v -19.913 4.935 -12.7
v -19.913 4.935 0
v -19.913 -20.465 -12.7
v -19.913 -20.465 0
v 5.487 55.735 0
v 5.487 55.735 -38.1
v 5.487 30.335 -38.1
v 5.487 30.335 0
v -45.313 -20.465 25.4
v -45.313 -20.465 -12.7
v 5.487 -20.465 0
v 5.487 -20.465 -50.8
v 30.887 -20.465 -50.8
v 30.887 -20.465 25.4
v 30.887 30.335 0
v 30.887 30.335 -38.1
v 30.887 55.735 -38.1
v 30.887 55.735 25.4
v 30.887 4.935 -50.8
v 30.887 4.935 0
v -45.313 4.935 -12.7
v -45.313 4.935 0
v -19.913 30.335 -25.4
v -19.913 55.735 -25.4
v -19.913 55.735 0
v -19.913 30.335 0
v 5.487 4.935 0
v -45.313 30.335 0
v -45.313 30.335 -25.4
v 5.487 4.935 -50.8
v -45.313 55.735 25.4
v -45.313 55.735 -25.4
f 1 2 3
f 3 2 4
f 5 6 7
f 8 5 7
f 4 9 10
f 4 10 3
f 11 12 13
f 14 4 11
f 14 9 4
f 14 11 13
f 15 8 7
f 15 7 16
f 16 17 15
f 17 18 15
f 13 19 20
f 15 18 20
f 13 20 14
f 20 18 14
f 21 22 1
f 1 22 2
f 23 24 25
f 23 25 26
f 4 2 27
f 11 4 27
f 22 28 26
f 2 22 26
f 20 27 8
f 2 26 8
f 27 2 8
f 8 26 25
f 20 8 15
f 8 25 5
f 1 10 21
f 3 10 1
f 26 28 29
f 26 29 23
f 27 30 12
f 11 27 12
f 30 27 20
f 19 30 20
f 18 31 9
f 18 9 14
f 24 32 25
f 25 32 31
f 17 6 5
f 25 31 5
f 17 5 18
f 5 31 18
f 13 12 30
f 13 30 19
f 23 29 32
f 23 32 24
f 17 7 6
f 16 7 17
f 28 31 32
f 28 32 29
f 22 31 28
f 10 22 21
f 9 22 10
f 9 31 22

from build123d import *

# Parameters (mm, degrees)
F0_W     = 76.2
F0_H     = 76.2
F1_DEPTH = 25.4
F2_W     = 25.4
F2_H     = 25.4
F3_DEPTH = 25.4
F4_W     = 25.4
F4_H     = 25.4
F5_DEPTH = 12.7
F6_W     = 25.4
F6_H     = 25.4
F7_DEPTH = 50.8
F8_W     = 25.4
F8_H     = 25.4
F9_DEPTH = 38.1


with BuildPart() as f1:
    # F0 (on Top) → F1 (new body)
    with BuildSketch(Plane.XY):
        with Locations((-7.212972, 17.6349)):
            Rectangle(F0_W, F0_H)
    extrude(amount=F1_DEPTH)

    # F2 (on face) → F3 (join)
    with BuildSketch(Plane(origin=(0, 0, 0), x_dir=(1, 0, 0), z_dir=(0, 0, -1))):
        with Locations((-32.612972, -43.0349)):
            Rectangle(F2_W, F2_H)
    extrude(amount=F3_DEPTH)

    # F4 (on face) → F5 (join)
    with BuildSketch(Plane(origin=(0, 0, 0), x_dir=(1, 0, 0), z_dir=(0, 0, -1))):
        with Locations((-32.612972, 7.7651)):
            Rectangle(F4_W, F4_H)
    extrude(amount=F5_DEPTH)

    # F6 (on face) → F7 (join)
    with BuildSketch(Plane(origin=(0, 0, 0), x_dir=(1, 0, 0), z_dir=(0, 0, -1))):
        with Locations((18.187028, 7.7651)):
            Rectangle(F6_W, F6_H)
    extrude(amount=F7_DEPTH)

    # F8 (on face) → F9 (join)
    with BuildSketch(Plane(origin=(0, 0, 0), x_dir=(1, 0, 0), z_dir=(0, 0, -1))):
        with Locations((18.187028, -43.0349)):
            Rectangle(F8_W, F8_H)
    extrude(amount=F9_DEPTH)


solid = f1.part
